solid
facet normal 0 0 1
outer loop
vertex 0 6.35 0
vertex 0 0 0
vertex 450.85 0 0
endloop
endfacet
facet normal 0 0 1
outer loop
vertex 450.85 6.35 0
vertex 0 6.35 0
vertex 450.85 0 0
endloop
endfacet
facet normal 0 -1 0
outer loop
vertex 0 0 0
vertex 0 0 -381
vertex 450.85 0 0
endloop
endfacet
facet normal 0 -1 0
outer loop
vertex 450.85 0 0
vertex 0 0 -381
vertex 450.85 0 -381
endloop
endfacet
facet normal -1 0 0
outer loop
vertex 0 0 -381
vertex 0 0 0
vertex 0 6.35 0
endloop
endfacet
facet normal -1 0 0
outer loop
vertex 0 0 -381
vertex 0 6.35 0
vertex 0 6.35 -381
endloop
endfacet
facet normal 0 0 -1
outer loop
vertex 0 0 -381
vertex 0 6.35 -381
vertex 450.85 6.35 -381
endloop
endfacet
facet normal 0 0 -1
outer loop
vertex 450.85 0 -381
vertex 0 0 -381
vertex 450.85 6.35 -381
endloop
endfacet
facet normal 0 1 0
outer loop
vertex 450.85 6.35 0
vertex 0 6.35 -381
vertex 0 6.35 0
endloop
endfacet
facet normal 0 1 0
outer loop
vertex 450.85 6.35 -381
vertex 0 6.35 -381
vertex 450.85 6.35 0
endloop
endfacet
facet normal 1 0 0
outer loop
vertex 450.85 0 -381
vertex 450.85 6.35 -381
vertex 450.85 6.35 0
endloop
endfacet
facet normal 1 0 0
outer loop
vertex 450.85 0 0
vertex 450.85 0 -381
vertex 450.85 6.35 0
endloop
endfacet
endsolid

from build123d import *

# Parameters (mm, degrees)
SKETCH1_W           = 1219.2
SKETCH1_H           = 609.6
BOSS_EXTRUDE1_DEPTH = 6.35
CUT_EXTRUDE1_REACH  = 1365.122
SKETCH9_W           = 450.85
SKETCH9_H           = 381
CUT_EXTRUDE2_DEPTH  = 6.35


with BuildPart() as part:
    # Sketch1 → Boss-Extrude1 (new body)
    with BuildSketch(Plane(origin=(0, 0, 0), x_dir=(1, 0, 0), z_dir=(0, 1, 0))):
        with Locations((609.6, 304.8)):
            Rectangle(SKETCH1_W, SKETCH1_H)
    extrude(amount=BOSS_EXTRUDE1_DEPTH)

    # Sketch7 → Cut-Extrude1 (cut, up to next)
    with BuildSketch(Plane(origin=(0, 6.35, 0), x_dir=(1, 0, 0), z_dir=(0, 1, 0)), mode=Mode.PRIVATE) as cut_extrude1_sk1:
        Polygon((501.65, 381), (952.5, 381), (952.5, 0), (1219.2, 0), (1219.2, 381), (1219.2, 609.6), (0, 609.6), (0, 381), (450.85, 381), (450.85, 0), (501.65, 0), align=None)
    cut_extrude1_tool1 = extrude(cut_extrude1_sk1.sketch, amount=-CUT_EXTRUDE1_REACH, mode=Mode.PRIVATE) & part.part
    add(cut_extrude1_tool1.solids().sort_by_distance((724.222881, 6.35, -403.048184))[0], mode=Mode.SUBTRACT)


with BuildPart() as cut_extrude1_piece_1:
    # of the separate pieces the step leaves, piece 1, a body of its own (cut_extrude1_pieces)
    add(part.part.solids().sort_by_distance((0, 0, 0))[0])


with BuildPart() as cut_extrude1_piece_2:
    # of the separate pieces the step leaves, piece 2, a body of its own (cut_extrude1_pieces)
    add(part.part.solids().sort_by_distance((501.65, 0, 0))[0])

    # Sketch9 → Cut-Extrude2 (cut)
    with BuildSketch(Plane(origin=(0, 6.35, 0), x_dir=(1, 0, 0), z_dir=(0, 1, 0))):
        with Locations((727.075, 190.5)):
            Rectangle(SKETCH9_W, SKETCH9_H)
    extrude(amount=-CUT_EXTRUDE2_DEPTH, mode=Mode.SUBTRACT)


solid = cut_extrude1_piece_1.part
